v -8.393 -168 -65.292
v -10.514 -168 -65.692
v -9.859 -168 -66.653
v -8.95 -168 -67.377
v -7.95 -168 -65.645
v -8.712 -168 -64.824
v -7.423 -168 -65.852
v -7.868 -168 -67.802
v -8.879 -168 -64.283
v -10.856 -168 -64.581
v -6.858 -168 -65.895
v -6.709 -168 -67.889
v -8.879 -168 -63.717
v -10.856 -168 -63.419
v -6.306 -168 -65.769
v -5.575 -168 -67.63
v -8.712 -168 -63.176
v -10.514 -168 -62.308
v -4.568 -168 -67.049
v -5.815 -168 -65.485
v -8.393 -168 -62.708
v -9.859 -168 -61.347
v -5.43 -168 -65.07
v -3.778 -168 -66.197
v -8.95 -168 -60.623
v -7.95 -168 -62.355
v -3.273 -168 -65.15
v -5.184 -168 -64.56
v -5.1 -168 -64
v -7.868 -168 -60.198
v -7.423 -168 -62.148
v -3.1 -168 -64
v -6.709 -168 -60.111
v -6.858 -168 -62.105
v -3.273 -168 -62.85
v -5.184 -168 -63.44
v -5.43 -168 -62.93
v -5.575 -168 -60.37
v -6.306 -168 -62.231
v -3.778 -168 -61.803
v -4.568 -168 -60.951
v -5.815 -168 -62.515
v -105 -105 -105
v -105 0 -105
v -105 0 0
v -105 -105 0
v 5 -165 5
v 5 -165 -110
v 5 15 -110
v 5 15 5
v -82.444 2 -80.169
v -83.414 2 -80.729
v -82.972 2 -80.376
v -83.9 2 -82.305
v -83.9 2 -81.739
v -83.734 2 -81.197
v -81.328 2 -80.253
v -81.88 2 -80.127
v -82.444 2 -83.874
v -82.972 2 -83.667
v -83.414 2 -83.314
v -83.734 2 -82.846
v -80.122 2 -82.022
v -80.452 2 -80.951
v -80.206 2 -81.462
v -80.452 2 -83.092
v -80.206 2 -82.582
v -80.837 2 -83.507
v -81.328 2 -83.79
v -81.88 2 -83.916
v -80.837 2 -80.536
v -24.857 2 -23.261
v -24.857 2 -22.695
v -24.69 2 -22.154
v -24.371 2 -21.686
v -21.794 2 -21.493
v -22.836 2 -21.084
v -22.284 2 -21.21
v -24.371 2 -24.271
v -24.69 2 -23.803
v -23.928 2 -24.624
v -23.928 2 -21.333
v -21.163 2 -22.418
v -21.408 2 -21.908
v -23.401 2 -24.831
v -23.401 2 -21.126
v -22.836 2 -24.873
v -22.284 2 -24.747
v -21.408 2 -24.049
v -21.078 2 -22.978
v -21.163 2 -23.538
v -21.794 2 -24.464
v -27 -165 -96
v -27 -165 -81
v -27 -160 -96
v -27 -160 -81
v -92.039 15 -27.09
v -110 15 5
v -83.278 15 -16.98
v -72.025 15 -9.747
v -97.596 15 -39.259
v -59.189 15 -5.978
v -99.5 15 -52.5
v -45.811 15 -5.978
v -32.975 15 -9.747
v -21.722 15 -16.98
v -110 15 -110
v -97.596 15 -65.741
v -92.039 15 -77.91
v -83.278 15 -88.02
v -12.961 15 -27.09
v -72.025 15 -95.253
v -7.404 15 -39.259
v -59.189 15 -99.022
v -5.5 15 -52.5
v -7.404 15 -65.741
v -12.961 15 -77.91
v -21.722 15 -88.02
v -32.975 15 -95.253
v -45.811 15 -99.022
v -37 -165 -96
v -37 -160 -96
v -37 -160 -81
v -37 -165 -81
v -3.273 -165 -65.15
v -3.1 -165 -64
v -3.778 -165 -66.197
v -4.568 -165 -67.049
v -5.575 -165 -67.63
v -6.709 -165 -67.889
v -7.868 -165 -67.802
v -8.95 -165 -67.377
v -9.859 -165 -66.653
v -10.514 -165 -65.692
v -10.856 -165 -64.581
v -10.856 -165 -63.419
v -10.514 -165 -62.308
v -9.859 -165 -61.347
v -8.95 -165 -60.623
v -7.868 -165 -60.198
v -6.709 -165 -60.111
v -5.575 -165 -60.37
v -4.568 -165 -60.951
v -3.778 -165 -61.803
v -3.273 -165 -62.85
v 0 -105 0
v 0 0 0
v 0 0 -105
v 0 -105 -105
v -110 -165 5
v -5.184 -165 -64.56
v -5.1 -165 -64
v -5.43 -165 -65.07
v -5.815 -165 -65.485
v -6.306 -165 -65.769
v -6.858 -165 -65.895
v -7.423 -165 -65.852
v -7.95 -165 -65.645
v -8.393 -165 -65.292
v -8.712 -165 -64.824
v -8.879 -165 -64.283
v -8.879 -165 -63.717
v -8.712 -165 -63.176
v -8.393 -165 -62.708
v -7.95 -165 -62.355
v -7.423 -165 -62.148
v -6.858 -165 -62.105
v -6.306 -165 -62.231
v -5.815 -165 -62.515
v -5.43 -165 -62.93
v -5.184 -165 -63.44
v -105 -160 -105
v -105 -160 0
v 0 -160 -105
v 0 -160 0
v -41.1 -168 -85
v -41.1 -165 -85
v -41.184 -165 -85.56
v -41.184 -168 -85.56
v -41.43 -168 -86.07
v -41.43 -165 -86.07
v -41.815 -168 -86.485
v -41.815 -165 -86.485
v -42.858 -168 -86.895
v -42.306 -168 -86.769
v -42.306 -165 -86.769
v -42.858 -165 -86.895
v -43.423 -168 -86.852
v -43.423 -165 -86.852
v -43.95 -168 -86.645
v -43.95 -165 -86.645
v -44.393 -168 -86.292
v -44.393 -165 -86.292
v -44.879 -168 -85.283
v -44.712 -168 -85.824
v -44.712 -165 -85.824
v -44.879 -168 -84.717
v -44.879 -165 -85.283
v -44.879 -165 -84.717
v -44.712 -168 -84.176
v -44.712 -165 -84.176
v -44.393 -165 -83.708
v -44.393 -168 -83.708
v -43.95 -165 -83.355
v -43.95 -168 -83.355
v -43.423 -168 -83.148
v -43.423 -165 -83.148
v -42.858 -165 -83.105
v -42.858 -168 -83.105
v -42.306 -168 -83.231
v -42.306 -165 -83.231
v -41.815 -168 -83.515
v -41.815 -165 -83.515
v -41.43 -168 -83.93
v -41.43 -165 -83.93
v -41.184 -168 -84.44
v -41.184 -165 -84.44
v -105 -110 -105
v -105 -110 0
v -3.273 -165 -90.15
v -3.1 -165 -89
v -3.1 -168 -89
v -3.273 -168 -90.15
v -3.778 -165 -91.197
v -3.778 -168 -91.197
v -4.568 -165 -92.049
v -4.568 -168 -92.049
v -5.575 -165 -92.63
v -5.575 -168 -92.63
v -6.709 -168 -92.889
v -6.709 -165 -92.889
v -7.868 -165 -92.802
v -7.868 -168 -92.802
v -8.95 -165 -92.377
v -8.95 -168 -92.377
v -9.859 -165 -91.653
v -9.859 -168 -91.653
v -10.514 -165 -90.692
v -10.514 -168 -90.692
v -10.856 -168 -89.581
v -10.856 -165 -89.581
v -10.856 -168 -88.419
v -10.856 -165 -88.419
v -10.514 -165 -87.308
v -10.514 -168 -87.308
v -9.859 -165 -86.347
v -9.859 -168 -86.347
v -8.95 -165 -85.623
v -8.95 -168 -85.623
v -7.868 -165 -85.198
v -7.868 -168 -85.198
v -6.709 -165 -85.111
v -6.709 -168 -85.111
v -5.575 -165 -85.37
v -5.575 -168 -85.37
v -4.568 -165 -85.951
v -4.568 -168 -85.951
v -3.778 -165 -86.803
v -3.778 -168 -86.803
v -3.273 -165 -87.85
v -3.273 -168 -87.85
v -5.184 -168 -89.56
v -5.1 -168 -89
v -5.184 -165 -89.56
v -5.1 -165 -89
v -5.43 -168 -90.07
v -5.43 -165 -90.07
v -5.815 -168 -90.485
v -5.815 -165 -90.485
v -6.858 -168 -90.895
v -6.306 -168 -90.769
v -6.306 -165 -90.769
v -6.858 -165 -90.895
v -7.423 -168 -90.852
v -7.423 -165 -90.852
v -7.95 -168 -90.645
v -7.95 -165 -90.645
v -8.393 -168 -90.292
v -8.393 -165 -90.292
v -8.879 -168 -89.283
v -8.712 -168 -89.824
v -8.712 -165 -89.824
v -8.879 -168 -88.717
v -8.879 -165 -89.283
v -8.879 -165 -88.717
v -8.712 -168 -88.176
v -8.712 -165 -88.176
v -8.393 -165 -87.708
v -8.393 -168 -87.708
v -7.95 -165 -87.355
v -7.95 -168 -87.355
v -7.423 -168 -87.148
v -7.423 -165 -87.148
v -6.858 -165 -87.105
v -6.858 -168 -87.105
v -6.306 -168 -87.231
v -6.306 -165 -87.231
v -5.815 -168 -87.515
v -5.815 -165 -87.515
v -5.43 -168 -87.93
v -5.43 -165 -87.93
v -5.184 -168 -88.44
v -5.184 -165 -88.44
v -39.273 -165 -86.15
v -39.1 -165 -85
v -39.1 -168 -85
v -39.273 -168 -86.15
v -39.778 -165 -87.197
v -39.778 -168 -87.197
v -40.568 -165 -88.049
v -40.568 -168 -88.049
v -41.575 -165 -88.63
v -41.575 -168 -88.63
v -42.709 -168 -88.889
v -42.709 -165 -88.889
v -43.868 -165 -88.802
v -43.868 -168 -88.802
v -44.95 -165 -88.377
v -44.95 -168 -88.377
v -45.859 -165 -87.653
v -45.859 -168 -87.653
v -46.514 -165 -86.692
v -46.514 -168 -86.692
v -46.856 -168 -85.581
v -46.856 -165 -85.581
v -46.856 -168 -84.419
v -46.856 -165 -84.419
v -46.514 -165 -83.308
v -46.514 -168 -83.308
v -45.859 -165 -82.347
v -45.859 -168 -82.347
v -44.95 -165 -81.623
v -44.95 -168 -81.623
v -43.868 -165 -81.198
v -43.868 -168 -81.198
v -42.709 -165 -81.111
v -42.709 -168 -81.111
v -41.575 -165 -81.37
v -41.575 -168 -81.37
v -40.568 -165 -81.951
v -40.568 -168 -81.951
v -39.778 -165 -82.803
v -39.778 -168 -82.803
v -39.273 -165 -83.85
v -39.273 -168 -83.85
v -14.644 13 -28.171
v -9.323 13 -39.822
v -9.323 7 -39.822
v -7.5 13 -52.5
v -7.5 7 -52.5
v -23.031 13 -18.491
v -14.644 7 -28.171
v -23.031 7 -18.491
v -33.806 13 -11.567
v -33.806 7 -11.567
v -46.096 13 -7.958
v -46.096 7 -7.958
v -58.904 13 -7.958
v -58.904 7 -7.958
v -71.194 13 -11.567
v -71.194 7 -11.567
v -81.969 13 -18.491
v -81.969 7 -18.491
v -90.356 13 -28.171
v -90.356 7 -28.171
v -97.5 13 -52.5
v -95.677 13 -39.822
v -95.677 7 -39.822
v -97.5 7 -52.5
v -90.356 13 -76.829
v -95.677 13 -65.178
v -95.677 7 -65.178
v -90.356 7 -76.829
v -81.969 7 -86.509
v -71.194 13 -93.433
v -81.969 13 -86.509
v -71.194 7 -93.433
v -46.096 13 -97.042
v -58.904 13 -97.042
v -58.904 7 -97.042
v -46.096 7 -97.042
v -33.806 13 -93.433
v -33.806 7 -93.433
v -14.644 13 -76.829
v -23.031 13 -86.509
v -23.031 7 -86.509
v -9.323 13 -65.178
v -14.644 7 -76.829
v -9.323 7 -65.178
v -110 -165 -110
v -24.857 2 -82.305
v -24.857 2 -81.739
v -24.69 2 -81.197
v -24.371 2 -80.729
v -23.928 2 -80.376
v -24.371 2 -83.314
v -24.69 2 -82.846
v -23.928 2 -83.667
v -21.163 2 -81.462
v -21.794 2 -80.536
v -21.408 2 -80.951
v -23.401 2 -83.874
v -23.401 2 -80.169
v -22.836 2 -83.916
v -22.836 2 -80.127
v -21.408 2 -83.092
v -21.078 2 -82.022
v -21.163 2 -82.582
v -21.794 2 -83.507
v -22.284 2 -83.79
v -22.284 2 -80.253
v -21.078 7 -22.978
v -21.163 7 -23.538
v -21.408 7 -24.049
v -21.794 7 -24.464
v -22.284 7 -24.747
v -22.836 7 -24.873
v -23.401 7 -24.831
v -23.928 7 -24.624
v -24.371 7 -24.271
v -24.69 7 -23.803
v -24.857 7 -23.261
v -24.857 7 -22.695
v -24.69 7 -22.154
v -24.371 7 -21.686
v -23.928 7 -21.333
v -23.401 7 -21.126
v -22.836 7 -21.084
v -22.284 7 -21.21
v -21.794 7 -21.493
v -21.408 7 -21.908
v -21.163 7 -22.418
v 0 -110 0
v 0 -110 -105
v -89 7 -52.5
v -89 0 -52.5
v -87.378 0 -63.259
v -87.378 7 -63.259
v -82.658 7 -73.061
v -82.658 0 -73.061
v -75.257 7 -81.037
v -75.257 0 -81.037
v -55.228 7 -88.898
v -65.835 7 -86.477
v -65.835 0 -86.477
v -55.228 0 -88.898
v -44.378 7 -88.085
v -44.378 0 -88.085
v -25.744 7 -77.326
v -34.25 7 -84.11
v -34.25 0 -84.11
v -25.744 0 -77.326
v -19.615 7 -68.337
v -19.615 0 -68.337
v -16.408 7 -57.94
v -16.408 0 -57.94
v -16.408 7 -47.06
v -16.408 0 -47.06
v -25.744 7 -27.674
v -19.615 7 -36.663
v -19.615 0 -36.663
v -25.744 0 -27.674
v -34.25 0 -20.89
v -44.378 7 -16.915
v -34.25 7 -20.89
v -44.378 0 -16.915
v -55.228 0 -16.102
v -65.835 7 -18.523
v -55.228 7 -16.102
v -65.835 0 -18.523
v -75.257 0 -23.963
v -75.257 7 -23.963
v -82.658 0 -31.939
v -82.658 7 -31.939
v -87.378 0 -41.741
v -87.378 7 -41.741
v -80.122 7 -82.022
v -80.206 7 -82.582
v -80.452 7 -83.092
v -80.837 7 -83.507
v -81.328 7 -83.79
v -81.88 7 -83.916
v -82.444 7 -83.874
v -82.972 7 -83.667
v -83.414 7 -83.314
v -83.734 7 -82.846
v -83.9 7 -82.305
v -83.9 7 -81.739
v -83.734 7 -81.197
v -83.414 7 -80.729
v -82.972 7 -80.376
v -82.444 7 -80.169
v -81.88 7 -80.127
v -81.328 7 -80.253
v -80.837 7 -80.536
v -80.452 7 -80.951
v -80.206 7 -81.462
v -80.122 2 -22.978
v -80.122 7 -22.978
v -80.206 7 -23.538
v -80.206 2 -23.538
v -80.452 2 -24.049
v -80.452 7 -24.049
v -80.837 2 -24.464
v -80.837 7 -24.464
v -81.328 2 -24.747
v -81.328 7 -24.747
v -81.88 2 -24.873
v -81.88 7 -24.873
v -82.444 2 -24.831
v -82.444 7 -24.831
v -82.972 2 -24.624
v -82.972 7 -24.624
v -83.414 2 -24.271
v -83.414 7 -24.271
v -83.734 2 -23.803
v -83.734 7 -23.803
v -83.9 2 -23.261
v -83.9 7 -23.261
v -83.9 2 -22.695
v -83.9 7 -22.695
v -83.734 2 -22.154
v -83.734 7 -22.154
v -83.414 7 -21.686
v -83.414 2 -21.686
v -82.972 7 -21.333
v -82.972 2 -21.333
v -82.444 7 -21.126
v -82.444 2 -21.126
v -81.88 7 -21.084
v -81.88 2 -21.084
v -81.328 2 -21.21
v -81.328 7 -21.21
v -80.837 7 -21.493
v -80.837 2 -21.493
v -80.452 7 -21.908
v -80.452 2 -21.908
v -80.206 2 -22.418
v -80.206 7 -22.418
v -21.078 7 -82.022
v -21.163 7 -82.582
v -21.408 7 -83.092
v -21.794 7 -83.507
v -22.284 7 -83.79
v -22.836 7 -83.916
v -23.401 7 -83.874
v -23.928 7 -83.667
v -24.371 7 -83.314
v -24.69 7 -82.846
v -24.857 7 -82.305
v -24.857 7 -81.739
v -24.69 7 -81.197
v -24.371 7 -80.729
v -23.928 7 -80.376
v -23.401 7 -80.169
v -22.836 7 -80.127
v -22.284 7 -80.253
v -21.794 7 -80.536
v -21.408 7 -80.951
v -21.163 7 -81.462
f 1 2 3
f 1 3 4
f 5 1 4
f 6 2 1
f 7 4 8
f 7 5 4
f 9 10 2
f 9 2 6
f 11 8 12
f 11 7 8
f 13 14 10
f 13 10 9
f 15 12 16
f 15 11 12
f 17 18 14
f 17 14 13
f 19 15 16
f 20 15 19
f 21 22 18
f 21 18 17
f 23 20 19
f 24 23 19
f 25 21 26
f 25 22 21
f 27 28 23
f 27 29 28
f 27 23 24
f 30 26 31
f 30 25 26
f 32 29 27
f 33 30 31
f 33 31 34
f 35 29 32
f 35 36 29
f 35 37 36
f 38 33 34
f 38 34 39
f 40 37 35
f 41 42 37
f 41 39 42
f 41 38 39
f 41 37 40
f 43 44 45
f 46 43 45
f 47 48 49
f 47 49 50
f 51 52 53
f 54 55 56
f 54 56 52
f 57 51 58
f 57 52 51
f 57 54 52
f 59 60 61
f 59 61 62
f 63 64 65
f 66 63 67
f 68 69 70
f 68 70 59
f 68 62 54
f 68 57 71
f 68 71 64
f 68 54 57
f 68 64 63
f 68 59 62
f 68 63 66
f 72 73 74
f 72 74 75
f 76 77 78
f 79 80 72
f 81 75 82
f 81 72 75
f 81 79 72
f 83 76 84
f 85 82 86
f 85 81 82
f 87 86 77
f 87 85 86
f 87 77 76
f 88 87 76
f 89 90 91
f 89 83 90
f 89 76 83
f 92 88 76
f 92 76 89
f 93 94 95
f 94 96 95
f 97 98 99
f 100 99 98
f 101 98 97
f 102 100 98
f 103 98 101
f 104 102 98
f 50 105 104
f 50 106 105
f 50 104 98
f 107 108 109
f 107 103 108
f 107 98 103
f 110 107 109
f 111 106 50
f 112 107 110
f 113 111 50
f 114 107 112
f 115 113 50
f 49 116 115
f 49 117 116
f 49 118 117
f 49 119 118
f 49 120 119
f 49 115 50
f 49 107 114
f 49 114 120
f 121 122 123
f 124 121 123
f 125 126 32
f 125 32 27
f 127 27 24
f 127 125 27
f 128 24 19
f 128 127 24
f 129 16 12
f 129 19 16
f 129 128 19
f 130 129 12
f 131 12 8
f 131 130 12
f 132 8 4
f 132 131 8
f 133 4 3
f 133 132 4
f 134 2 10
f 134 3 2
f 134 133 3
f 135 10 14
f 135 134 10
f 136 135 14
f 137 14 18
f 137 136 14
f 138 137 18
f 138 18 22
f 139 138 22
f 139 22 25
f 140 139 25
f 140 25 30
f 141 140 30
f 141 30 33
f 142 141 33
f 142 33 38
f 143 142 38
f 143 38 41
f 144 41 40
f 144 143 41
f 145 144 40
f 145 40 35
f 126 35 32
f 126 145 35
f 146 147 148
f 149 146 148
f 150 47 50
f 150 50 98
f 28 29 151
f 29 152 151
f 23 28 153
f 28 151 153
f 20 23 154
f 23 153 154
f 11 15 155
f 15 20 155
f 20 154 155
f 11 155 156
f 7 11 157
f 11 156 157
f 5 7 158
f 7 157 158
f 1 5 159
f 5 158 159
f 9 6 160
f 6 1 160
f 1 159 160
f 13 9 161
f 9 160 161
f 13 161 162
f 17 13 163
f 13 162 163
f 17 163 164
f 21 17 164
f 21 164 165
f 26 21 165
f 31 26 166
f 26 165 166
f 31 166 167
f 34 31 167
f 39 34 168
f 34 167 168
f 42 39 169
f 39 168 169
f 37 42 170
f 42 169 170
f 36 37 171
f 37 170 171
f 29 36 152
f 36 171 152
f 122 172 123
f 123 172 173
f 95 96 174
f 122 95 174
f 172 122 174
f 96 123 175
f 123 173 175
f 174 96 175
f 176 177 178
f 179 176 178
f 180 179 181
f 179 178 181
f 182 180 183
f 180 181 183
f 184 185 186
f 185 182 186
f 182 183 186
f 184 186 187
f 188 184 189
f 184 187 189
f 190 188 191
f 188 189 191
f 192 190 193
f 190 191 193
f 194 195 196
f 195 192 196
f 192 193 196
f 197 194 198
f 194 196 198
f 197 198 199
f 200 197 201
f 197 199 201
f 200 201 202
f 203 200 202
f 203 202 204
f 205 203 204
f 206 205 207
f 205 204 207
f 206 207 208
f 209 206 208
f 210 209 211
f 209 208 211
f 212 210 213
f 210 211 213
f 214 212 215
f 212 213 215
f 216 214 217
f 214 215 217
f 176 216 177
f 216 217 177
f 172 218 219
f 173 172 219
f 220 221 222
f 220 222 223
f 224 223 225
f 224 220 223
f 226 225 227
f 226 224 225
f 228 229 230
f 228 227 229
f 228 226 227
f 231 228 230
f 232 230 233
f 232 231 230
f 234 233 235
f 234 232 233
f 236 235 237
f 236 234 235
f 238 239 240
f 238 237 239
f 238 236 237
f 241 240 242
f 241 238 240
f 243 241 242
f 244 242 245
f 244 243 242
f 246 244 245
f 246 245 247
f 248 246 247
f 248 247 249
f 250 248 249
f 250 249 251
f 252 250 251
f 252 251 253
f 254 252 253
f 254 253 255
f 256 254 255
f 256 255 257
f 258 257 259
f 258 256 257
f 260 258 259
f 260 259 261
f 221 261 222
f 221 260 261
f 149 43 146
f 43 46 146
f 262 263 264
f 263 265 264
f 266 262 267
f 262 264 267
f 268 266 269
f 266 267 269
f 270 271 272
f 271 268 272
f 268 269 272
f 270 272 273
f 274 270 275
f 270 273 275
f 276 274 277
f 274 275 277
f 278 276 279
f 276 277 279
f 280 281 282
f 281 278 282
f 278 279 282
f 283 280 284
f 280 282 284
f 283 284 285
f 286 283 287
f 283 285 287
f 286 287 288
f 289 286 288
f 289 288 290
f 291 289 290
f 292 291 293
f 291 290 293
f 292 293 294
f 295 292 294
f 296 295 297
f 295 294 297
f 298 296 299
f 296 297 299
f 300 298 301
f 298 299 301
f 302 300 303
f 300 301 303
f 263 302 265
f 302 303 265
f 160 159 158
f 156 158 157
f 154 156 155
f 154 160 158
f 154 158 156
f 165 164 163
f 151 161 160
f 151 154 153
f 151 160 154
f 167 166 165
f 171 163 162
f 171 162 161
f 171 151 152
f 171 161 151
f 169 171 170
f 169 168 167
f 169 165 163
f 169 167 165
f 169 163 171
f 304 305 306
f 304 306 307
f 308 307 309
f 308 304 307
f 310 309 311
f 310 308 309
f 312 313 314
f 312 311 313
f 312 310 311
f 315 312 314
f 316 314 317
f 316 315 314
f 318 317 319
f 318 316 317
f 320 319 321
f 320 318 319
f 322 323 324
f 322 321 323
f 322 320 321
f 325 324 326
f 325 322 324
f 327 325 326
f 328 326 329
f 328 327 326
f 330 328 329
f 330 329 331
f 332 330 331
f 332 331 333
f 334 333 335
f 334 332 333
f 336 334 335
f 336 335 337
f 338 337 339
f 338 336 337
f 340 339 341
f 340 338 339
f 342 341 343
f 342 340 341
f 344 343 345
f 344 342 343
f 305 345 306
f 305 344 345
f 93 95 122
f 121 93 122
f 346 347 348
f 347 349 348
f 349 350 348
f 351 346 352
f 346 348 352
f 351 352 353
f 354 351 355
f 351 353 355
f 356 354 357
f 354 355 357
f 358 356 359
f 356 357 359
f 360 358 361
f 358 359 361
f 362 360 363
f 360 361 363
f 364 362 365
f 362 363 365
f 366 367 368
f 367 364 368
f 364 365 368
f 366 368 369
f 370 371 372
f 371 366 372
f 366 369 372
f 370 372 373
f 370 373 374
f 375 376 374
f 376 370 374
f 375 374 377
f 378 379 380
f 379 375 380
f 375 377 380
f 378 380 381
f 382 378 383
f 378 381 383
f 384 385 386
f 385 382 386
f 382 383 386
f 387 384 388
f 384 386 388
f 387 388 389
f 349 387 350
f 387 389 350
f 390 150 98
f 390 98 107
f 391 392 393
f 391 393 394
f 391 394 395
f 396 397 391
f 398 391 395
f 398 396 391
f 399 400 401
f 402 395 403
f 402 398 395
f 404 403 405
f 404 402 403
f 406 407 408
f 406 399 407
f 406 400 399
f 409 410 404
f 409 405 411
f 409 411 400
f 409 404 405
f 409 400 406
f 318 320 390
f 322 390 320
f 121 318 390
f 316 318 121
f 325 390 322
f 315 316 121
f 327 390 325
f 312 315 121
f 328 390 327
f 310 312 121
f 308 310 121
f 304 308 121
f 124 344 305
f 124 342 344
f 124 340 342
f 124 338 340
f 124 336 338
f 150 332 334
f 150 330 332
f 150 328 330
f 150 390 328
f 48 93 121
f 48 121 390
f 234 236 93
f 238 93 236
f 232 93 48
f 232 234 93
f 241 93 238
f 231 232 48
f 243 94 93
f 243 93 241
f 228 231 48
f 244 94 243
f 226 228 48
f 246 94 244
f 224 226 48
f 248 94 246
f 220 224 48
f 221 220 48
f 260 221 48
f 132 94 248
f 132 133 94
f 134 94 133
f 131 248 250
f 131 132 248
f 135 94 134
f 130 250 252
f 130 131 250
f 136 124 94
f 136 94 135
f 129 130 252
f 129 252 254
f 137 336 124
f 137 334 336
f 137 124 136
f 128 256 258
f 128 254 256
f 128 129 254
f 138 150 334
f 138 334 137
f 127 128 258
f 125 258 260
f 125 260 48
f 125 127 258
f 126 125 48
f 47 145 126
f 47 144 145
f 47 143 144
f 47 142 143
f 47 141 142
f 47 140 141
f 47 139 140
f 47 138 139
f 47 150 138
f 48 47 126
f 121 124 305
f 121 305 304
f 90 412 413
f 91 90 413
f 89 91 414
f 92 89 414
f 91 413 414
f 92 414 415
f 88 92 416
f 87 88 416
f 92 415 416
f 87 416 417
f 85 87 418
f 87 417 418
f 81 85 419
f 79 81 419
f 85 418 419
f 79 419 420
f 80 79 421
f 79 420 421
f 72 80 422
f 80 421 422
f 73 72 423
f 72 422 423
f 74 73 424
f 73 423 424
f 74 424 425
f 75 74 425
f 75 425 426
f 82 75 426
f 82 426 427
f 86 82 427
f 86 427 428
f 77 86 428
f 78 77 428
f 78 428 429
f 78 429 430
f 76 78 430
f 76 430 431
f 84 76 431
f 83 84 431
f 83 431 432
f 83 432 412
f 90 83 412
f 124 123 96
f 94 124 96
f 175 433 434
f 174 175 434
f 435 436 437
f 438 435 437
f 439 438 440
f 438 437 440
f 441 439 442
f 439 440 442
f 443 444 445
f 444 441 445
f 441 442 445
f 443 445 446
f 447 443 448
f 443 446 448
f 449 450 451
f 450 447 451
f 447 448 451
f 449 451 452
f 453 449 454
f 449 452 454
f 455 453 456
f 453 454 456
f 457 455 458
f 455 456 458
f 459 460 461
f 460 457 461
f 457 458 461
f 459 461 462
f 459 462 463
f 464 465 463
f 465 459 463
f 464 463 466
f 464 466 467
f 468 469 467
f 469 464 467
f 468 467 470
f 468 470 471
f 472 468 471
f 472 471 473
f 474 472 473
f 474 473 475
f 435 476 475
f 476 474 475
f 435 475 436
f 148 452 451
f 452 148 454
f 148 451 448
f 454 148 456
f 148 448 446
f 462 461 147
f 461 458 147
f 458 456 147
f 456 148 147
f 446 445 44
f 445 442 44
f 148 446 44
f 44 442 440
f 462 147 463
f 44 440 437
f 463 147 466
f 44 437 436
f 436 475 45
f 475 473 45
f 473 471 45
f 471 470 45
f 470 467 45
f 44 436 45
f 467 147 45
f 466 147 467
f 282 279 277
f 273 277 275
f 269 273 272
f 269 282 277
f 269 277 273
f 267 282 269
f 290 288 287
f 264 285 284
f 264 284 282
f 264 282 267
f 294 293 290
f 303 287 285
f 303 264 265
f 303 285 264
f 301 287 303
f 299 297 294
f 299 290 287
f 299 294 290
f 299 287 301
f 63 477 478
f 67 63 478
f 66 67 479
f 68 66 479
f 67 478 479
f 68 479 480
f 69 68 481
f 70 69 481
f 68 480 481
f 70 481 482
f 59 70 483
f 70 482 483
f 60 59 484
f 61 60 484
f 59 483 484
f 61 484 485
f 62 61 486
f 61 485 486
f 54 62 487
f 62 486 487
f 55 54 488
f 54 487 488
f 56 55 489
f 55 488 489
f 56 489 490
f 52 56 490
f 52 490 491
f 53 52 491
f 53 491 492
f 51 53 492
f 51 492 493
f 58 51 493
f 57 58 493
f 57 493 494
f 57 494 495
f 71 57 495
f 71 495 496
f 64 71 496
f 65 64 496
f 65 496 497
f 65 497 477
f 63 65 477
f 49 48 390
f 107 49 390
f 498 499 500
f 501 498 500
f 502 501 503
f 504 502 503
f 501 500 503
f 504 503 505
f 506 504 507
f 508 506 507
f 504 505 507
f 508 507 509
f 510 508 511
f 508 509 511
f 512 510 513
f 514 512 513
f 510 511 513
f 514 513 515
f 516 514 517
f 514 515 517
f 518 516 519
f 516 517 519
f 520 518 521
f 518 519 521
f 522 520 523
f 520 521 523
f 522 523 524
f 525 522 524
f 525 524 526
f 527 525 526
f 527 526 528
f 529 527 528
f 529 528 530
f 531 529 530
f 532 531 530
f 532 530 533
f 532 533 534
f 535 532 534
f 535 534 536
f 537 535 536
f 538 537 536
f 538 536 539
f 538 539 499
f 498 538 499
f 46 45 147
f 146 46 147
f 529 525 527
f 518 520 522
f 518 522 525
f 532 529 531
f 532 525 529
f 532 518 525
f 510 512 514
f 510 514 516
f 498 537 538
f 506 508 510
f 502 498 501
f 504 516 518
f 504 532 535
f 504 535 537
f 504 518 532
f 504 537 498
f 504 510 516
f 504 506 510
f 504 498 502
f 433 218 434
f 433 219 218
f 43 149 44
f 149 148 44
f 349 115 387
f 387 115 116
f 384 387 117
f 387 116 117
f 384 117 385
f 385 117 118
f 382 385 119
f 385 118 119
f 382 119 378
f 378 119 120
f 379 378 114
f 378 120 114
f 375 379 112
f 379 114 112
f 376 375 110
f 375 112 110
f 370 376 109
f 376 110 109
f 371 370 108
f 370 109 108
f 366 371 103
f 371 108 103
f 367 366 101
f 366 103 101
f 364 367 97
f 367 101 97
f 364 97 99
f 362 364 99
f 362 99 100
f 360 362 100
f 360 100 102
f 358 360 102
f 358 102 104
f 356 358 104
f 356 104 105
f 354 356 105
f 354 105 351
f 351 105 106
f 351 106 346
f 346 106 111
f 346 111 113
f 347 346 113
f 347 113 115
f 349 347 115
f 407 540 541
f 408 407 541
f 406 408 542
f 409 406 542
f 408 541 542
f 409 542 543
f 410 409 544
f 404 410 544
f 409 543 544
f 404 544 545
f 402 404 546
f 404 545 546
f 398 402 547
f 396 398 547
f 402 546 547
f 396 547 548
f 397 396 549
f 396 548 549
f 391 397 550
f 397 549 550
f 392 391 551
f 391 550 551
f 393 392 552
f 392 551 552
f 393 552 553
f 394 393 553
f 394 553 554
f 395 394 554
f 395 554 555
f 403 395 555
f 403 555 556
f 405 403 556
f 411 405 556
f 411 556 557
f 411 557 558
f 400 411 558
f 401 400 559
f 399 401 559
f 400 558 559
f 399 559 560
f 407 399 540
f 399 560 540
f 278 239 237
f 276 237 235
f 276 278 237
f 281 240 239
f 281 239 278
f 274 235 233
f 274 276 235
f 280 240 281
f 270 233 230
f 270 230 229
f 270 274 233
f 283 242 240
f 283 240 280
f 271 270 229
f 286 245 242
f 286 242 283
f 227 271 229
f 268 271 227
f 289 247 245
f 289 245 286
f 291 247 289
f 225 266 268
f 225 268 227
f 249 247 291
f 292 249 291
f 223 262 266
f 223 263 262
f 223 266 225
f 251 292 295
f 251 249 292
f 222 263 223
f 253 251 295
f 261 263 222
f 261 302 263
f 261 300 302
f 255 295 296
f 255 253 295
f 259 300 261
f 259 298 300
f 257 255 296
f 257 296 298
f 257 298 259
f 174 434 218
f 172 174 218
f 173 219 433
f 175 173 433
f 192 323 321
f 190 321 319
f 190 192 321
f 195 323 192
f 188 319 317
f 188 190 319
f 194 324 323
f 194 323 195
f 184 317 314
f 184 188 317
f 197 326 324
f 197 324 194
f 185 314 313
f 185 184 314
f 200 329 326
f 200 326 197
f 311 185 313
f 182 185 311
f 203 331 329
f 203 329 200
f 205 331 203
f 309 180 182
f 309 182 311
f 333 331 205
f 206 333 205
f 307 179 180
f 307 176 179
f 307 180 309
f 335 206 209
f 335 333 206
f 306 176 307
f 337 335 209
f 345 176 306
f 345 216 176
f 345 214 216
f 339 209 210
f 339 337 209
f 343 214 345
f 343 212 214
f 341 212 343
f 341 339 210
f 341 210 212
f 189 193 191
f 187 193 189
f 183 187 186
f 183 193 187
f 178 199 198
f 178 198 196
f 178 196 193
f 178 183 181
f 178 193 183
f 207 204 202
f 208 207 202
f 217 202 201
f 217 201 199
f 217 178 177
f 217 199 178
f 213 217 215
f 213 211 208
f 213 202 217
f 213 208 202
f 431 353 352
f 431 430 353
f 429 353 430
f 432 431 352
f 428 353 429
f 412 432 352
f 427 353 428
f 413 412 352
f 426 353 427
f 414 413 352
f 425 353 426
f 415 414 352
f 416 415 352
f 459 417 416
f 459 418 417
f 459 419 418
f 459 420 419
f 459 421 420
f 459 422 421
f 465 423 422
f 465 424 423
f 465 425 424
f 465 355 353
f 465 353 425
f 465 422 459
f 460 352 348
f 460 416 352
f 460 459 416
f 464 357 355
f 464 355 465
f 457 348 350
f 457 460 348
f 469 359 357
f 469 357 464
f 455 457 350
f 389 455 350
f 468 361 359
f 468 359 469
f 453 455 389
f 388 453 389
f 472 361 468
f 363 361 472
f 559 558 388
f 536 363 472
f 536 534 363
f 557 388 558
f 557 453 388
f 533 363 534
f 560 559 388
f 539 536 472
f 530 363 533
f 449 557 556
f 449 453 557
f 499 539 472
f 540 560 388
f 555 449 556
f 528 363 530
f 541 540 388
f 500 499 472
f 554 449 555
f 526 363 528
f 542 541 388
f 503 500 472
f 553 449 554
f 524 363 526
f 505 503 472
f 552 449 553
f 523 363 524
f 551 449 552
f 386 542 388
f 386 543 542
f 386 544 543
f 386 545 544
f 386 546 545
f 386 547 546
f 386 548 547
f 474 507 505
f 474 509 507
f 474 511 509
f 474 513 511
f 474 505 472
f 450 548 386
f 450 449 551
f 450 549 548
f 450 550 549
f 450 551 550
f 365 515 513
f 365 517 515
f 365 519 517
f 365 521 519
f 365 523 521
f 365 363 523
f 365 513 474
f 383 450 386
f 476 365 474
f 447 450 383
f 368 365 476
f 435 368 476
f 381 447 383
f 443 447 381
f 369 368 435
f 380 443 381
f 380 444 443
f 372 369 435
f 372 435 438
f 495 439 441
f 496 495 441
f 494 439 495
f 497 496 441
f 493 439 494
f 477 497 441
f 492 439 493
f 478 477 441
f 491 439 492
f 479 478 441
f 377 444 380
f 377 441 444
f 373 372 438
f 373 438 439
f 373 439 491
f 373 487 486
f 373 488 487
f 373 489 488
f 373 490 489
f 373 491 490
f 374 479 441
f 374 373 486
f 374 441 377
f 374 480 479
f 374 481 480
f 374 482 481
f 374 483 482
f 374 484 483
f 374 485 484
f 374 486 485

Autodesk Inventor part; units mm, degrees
ref_plane "YZ Plane" through (0, 0, 0) normal (1, 0, 0) x (0, 1, 0)
ref_plane "XZ Plane" through (0, 0, 0) normal (0, 1, 0) x (-1, 0, 0)
sketch "Sketch1" plane through (0, 0, 0) normal (0, 1, 0) x (-1, 0, 0)
  line L0 (0, 0) -> (105, 0)
  line L1 (105, 0) -> (105, -105)
  line L2 (105, -105) -> (0, -105)
  line L3 (0, -105) -> (0, 0)
  circle A0 centre (52.5, -52.5) radius 36.5
  dimension "d0" = 105
  dimension "d1" = 105
  dimension "d2" = 52.5
  dimension "d3" = 52.5
  dimension "d4" = 73
extrude "Extrusion1" add sketch "Sketch1" along normal blind 7
sketch "Sketch3" plane through (-105, 0, 0) normal (0, 0, 1) x (1, 0, 0)
  line L0 (105, 7) -> (0, 7) projected
  line L1 (0, 7) -> (105, 7)
  line L2 (105, 7) -> (105, -105)
  line L3 (105, -105) -> (0, -105)
  line L4 (0, -105) -> (0, 7)
  line L5 (0, 0) -> (105, 0) projected
  dimension "d7" = 105
extrude "Extrusion2" add sketch "Sketch3" along normal blind 5
sketch "Sketch4" plane through (-105, 0, -105) normal (-1, 0, 0) x (0, 0, 1)
  line L0 (0, 0) -> (0, 7) projected
  line L1 (0, 7) -> (110, 7)
  line L2 (110, 7) -> (110, -105)
  line L3 (110, -105) -> (0, -105)
  line L4 (0, -105) -> (0, 7)
  point P0 (105, 0)
extrude "Extrusion3" add sketch "Sketch4" along normal blind 5
sketch "Sketch6" plane through (0, 0, -105) normal (0, 0, -1) x (-1, 0, 0)
  line L0 (0, 7) -> (110, 7) projected
  line L1 (110, -105) -> (110, 7) projected
  line L2 (0, 7) -> (110, 7)
  line L3 (110, 7) -> (110, -105)
  line L4 (110, -105) -> (0, -105)
  line L5 (0, -105) -> (0, 7)
  point P0 (0, 0)
extrude "Extrusion4" add sketch "Sketch6" along normal blind 5
sketch "Sketch7" plane through (0, -105, 0) normal (1, 0, 0) x (0, 0, -1)
  line L0 (-5, 0) -> (-5, 112) projected
  line L1 (105, 0) -> (110, 0) projected
  line L2 (-5, 112) -> (110, 112)
  line L3 (110, 112) -> (110, 0)
  line L4 (110, 0) -> (-5, 0)
  line L5 (-5, 0) -> (-5, 112)
  point P0 (0, 105)
extrude "Extrusion5" add sketch "Sketch7" along normal blind 5
sketch "Sketch8" plane through (-110, -105, -110) normal (0, -1, 0) x (1, 0, 0)
  line L0 (0, 115) -> (115, 115) projected
  line L1 (0, 0) -> (115, 0) projected
  line L2 (0, 115) -> (115, 115)
  line L3 (115, 115) -> (115, 0)
  line L4 (115, 0) -> (0, 0)
  line L5 (0, 0) -> (0, 115)
  point P0 (110, 110)
extrude "Extrusion6" add sketch "Sketch8" along normal blind 5
sketch "Sketch9" plane through (0, 7, 0) normal (0, 1, 0) x (1, 0, 0)
  line L0 (-110, -5) -> (-110, 110) projected
  line L1 (-110, -5) -> (5, -5) projected
  line L2 (5, 110) -> (5, -5) projected
  line L3 (-110, 110) -> (5, 110) projected
  circle A0 centre (-52.5, 52.5) radius 36.5 projected
  line L4 (-110, -5) -> (-110, 110) projected
  line L5 (-110, 110) -> (5, 110) projected
  line L6 (-110, -5) -> (5, -5)
  line L7 (5, -5) -> (5, 110)
  line L8 (5, 110) -> (-110, 110)
  line L9 (-110, 110) -> (-110, -5)
  circle A1 centre (-52.5, 52.5) radius 45
  dimension "d18" = 90
extrude "Extrusion7" add sketch "Sketch9" along normal blind 8 contours L0 L3 L2 L1
sketch "Sketch10" plane through (-52.5, 7, -52.5) normal (0, 1, 0) x (1, 0, 0)
  line L0 (57.5, -57.5) -> (-57.5, -57.5) construction
  line L1 (57.5, 57.5) -> (57.5, -57.5) construction
  line L2 (-57.5, -57.5) -> (57.5, 57.5) construction
  line L3 (57.5, 57.5) -> (-57.5, 57.5) construction
  line L4 (-57.5, 57.5) -> (57.5, -57.5) construction
  circle A0 centre (0, 0) radius 41.75 construction
  circle A1 centre (-29.5217, -29.5217) radius 1.9
  circle A2 centre (-29.5217, 29.5217) radius 1.9
  circle A3 centre (29.5217, 29.5217) radius 1.9
  circle A4 centre (29.5217, -29.5217) radius 1.9
  line L5 (0, -57.5) -> (0, 57.5) construction
  point P0 (52.5, -52.5)
  dimension "d21" = 3.8
  dimension "d22" = 83.5
  dimension "d23" = 3.8
  dimension "d24" = 3.8
  dimension "d25" = 3.8
  dimension "d26" = 45
extrude "Extrusion8" cut sketch "Sketch10" against normal blind 5
ref_plane "Work Plane1" through (0, 0, -52.5) normal (0, 0, -1) x (-1, 0, 0)
split "Split2" [suppressed]
chamfer "Chamfer1" distance 2 angle 45 1 edges at (-97.5, 15, -52.5)
sketch "Sketch15" plane through (0, 0, -52.5) normal (0, 0, -1) x (-1, 0, 0)
  line L0 (105, 14) -> (99.9142, 14)
  line L1 (99.9142, 14) -> (98.5, 12.5858)
  line L2 (98.5, 12.5858) -> (98.5, 6)
  line L3 (98.5, 6) -> (90, 6)
  line L4 (90, 6) -> (90, 1)
  line L5 (90, 1) -> (100, 1)
  arc A0 (106, -5) -> (100, 1) centre (100, -5) ccw
  line L6 (106, -5) -> (106, -100)
  arc A1 (100, -106) -> (106, -100) centre (100, -100) ccw
  line L7 (100, -106) -> (5, -106)
  arc A2 (-1, -100) -> (5, -106) centre (5, -100) ccw
  line L8 (-1, -100) -> (-1, -5)
  arc A3 (5, 1) -> (-1, -5) centre (5, -5) ccw
  line L9 (5, 1) -> (15, 1)
  line L10 (15, 1) -> (15, 6)
  line L11 (15, 6) -> (6.5, 6)
  line L12 (6.5, 6) -> (6.5, 12.5858)
  line L13 (6.5, 12.5858) -> (5.0858, 14)
  line L14 (5.0858, 14) -> (0, 14)
  arc A4 (0, 14) -> (-4, 10) centre (0, 10) ccw
  line L15 (-4, 10) -> (-4, -105)
  arc A5 (-4, -105) -> (0, -109) centre (0, -105) ccw
  line L16 (0, -109) -> (105, -109)
  arc A6 (105, -109) -> (109, -105) centre (105, -105) ccw
  line L17 (109, -105) -> (109, 10)
  arc A7 (109, 10) -> (105, 14) centre (105, 10) ccw
  line L18 (89, 0) -> (89, 7) projected
  line L19 (89, 7) -> (97.5, 7) projected
  line L20 (97.5, 7) -> (97.5, 13) projected
  line L21 (97.5, 13) -> (99.5, 15) projected
  line L22 (99.5, 15) -> (110, 15) projected
  line L23 (110, 15) -> (110, -110) projected
  line L24 (110, -110) -> (-5, -110) projected
  line L25 (-5, -110) -> (-5, 15) projected
  line L26 (-5, 15) -> (5.5, 15) projected
  line L27 (5.5, 15) -> (7.5, 13) projected
  line L28 (7.5, 13) -> (7.5, 7) projected
  line L29 (7.5, 7) -> (16, 7) projected
  line L30 (16, 7) -> (16, 0) projected
  line L31 (16, 0) -> (0, 0) projected
  line L32 (0, 0) -> (0, -105) projected
  line L33 (0, -105) -> (105, -105) projected
  line L34 (105, -105) -> (105, 0) projected
  line L35 (105, 0) -> (89, 0) projected
extrude "Extrusion11" [suppressed]
sketch "Sketch16" plane through (-110, -110, -110) normal (0, -1, 0) x (1, 0, 0)
  line L0 (10, 57.5) -> (105, 57.5) projected
  line L1 (10, 57.5) -> (10, 54.5) projected
  line L2 (10, 54.5) -> (105, 54.5) projected
  line L3 (105, 57.5) -> (105, 54.5) projected
  circle A0 centre (57.5, 56) radius 2
  line L4 (115, 57.5) -> (0, 57.5) projected
  point P0 (110, 110)
  point P1 (110, 57.5)
  point P2 (5, 57.5)
  dimension "d53" = 95
  dimension "d54" = 47.5
  dimension "d55" = 4
  dimension "d58" = 1.5
extrude "Extrusion14" [suppressed]
sketch "Sketch17" plane through (0, 0, -110) normal (0, 0, -1) x (-1, 0, 0)
  line L0 (110, 15) -> (110, -110) projected
  line L1 (110, -110) -> (-5, -110)
  line L2 (-5, -110) -> (-5, -160)
  line L3 (-5, -160) -> (110, -160)
  line L4 (110, -160) -> (110, -110)
  line L5 (-5, 15) -> (-5, -110) projected
  point P0 (0, 0)
  dimension "d59" = 50
extrude "Extrusion15" add sketch "Sketch17" against normal blind 5
sketch "Sketch18" plane through (5, -105, 0) normal (1, 0, 0) x (0, 0, -1)
  line L0 (105, -5) -> (-5, -5)
  line L1 (-5, -5) -> (-5, -55)
  line L2 (-5, -55) -> (105, -55)
  line L3 (105, -55) -> (105, -5)
  line L4 (-5, -5) -> (-5, 120) projected
  line L5 (110, -55) -> (105, -55) projected
  point P0 (0, 105)
extrude "Extrusion16" add sketch "Sketch18" against normal blind 5
sketch "Sketch19" plane through (-105, 0, 5) normal (0, 0, 1) x (1, 0, 0)
  line L0 (105, -110) -> (-5, -110) projected
  line L1 (-5, -160) -> (105, -160) projected
  line L2 (-5, -110) -> (105, -110)
  line L3 (105, -110) -> (105, -160)
  line L4 (105, -160) -> (-5, -160)
  line L5 (-5, -160) -> (-5, -110)
  point P0 (105, 0)
extrude "Extrusion17" add sketch "Sketch19" against normal blind 5
sketch "Sketch20" plane through (-110, 0, -105) normal (-1, 0, 0) x (0, 0, 1)
  line L0 (-5, -160) -> (110, -160) projected
  line L1 (0, -110) -> (105, -110)
  line L2 (105, -110) -> (105, -160)
  line L3 (105, -160) -> (0, -160)
  line L4 (0, -160) -> (0, -110)
  point P0 (105, 0)
extrude "Extrusion18" add sketch "Sketch20" against normal blind 5
sketch "Sketch21" plane through (-110, -160, -110) normal (0, -1, 0) x (1, 0, 0)
  line L0 (115, 0) -> (0, 0) projected
  line L1 (115, 115) -> (0, 115) projected
  line L2 (0, 0) -> (115, 0)
  line L3 (115, 0) -> (115, 115)
  line L4 (115, 115) -> (0, 115)
  line L5 (0, 115) -> (0, 0)
  point P0 (110, 110)
extrude "Extrusion19" add sketch "Sketch21" along normal blind 5
sketch "Sketch25" plane through (-110, -165, -110) normal (0, -1, 0) x (1, 0, 0)
  line L0 (65, 50) -> (105, 50) construction
  line L1 (105, 50) -> (105, 10) construction
  line L2 (105, 10) -> (65, 10) construction
  line L3 (65, 10) -> (65, 50) construction
  line L4 (65, 50) -> (105, 10) construction
  line L5 (105, 50) -> (65, 10) construction
  circle A0 centre (67, 46) radius 1.9
  circle A1 centre (103, 46) radius 1.9
  circle A2 centre (67, 25) radius 1.9
  circle A3 centre (103, 21) radius 1.9
  circle A4 centre (103, 46) radius 3.9
  circle A5 centre (67, 25) radius 3.9
  circle A6 centre (103, 21) radius 3.9
  line L6 (115, 0) -> (115, 115) projected
  line L7 (0, 0) -> (115, 0) projected
  line L8 (83, 14) -> (73, 14)
  line L9 (73, 14) -> (73, 29)
  line L10 (73, 29) -> (83, 29)
  line L11 (83, 29) -> (83, 14)
  line L12 (63, 50) -> (71, 50)
  line L13 (71, 50) -> (71, 42)
  line L14 (71, 42) -> (63, 42)
  line L15 (63, 42) -> (63, 50)
  line L16 (63, 50) -> (71, 42) construction
  line L17 (71, 50) -> (63, 42) construction
  point P0 (110, 110)
  point P1 (85, 30)
  dimension "d101" = 40
  dimension "d102" = 40
  dimension "d103" = 3.8
  dimension "d104" = 3.8
  dimension "d105" = 3.8
  dimension "d106" = 3.8
  dimension "d107" = 4
  dimension "d108" = 2
  dimension "d109" = 2
  dimension "d110" = 4
  dimension "d111" = 25
  dimension "d112" = 2
  dimension "d113" = 29
  dimension "d114" = 2
  dimension "d116" = 2
  dimension "d117" = 2
  dimension "d118" = 2
  dimension "d124" = 10
  dimension "d125" = 10
  dimension "d126" = 10
  dimension "d127" = 15
  dimension "d128" = 4
  dimension "d129" = 8
  dimension "d134" = 4
  dimension "d135" = 4
  dimension "d136" = 8
  dimension "d137" = 8
extrude "Extrusion23" add sketch "Sketch25" along normal blind 3 contours A4 | A5 | A6
extrude "Extrusion24" cut sketch "Sketch25" along normal blind 3 and the other way blind 5 contours L8 L9 L10 L11
sketch "Sketch26" plane through (0, 0, -110) normal (0, 0, -1) x (-1, 0, 0)
  line L0 (-5, 15) -> (-5, -165) projected
  line L1 (110, -165) -> (-5, -165) projected
  line L2 (105, -160) -> (0, -160) construction
  line L3 (40, -145) -> (0, -145)
  line L4 (0, -145) -> (0, -105)
  line L5 (0, -105) -> (40, -105)
  line L6 (40, -105) -> (40, -145)
  line L7 (33.4662, -145) -> (33.4662, -105) construction
  line L8 (3.4673, -145) -> (3.4673, -105) construction
  line L9 (40, -137.8014) -> (0, -137.8014) construction
  line L10 (0, -160) -> (0, -110) construction
  point P0 (0, 0)
  dimension "d142" = 40
  dimension "d143" = 40
  dimension "d144" = 20
  dimension "d145" = 5
equation "\"d2\" = 0.5 * d1"
equation "\"d3\" = 0.5 * d0"
equation "\"d23\" = d21"
equation "\"d24\" = d23"
equation "\"d25\" = d24"
equation "\"d54\" = 0.5 * d53"
equation "\"d104\" = d103"
equation "\"d105\" = d103"
equation "\"d106\" = d103"
equation "\"d112\" = d108"
equation "\"d114\" = d109"
equation "\"d116\" = d115"
equation "\"d117\" = d115"
equation "\"d118\" = d115"
equation "\"d115\" = 2"
properties part number "groovev2"
